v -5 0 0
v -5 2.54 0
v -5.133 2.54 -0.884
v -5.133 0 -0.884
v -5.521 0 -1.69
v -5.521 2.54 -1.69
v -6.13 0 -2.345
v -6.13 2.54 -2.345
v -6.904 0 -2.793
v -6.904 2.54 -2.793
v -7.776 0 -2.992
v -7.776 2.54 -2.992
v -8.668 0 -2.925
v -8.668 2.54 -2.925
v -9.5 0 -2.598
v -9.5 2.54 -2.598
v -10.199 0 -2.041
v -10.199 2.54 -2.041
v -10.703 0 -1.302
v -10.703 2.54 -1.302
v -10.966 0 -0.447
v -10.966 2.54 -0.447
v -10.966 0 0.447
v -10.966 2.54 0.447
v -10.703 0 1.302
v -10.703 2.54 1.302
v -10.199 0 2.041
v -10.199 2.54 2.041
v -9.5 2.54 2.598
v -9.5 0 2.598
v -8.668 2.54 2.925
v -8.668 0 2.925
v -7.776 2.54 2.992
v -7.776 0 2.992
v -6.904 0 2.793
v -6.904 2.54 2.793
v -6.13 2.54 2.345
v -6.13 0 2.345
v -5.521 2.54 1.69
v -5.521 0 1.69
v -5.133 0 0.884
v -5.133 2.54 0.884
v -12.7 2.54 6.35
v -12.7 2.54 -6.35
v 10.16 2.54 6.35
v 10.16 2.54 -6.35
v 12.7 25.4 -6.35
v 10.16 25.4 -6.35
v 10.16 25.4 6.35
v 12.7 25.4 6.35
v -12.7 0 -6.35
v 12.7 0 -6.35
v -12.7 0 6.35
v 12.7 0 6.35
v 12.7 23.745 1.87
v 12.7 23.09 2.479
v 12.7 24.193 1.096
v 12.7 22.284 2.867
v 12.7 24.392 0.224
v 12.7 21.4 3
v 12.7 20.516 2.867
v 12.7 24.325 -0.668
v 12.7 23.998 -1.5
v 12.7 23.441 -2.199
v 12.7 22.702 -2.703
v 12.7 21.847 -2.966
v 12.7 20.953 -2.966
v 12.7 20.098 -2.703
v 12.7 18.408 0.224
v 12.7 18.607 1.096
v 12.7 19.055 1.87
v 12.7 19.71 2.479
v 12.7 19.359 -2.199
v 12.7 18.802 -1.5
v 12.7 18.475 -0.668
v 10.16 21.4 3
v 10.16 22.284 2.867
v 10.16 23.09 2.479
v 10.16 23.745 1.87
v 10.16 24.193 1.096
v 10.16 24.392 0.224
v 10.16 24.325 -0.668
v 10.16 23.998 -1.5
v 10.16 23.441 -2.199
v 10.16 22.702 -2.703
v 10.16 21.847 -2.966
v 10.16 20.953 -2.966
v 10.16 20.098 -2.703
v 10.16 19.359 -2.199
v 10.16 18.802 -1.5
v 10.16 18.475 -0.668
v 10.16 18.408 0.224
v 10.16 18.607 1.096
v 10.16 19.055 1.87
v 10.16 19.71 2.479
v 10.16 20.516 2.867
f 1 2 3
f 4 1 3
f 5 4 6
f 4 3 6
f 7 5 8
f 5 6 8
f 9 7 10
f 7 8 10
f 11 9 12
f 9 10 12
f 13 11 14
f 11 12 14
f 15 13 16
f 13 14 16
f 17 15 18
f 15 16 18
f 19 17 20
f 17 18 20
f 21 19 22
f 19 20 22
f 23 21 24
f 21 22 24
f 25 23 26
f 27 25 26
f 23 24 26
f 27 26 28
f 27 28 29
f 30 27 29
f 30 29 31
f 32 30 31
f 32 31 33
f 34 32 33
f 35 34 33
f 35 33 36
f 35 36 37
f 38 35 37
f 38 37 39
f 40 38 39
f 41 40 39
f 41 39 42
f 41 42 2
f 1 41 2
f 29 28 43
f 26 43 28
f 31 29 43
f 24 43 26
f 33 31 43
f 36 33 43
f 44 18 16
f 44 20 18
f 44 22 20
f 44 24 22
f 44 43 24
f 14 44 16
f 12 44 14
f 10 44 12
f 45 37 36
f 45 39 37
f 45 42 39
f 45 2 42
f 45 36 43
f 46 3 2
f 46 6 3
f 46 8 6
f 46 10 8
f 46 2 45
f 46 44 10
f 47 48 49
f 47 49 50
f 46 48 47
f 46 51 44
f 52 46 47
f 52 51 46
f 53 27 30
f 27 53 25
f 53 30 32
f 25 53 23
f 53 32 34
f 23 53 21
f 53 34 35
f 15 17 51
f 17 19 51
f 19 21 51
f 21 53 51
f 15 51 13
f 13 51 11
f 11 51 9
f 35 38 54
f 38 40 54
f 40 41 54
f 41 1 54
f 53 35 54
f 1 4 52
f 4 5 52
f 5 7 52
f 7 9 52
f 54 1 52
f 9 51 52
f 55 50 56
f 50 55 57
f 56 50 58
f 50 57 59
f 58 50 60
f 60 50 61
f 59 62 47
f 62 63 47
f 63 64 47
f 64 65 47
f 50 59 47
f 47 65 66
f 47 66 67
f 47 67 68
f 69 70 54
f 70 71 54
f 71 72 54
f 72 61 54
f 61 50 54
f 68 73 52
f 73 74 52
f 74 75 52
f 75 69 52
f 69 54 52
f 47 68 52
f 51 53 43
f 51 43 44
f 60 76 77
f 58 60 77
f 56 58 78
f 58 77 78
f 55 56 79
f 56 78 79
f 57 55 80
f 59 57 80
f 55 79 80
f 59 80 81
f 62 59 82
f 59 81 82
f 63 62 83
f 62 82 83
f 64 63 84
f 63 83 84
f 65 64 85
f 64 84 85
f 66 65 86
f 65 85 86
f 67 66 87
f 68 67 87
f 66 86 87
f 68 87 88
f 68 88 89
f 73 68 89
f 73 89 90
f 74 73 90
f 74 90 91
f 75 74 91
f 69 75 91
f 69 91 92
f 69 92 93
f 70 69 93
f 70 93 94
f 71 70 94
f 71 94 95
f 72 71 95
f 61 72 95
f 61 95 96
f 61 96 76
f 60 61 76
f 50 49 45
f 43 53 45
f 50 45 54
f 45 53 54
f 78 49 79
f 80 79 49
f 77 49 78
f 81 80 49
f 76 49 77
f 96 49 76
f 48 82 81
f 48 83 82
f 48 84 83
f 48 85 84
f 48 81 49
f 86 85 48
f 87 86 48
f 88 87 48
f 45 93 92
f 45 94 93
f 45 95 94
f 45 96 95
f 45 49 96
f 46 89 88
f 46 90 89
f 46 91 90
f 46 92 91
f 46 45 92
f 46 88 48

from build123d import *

# Parameters (mm, degrees)
SKETCH1_W           = 25.4
SKETCH1_H           = 12.7
BOSS_EXTRUDE1_DEPTH = 2.54
SKETCH2_W           = 2.54
SKETCH2_H           = 12.7
BOSS_EXTRUDE2_DEPTH = 22.86
SKETCH3_R           = 3
CUT_EXTRUDE1_DEPTH  = 22.86
SKETCH4_R           = 3
CUT_EXTRUDE2_DEPTH  = 22.86


with BuildPart() as part:
    # Sketch1 → Boss-Extrude1 (new body)
    with BuildSketch(Plane(origin=(0, 0, 0), x_dir=(1, 0, 0), z_dir=(0, 1, 0))):
        Rectangle(SKETCH1_W, SKETCH1_H)
    extrude(amount=BOSS_EXTRUDE1_DEPTH)

    # Sketch2 → Boss-Extrude2 (add)
    with BuildSketch(Plane(origin=(0, 2.54, 0), x_dir=(1, 0, 0), z_dir=(0, 1, 0))):
        with Locations((11.43, 0)):
            Rectangle(SKETCH2_W, SKETCH2_H)
    extrude(amount=BOSS_EXTRUDE2_DEPTH)

    # Sketch3 → Cut-Extrude1 (cut)
    with BuildSketch(Plane(origin=(0, 2.54, 0), x_dir=(1, 0, 0), z_dir=(0, 1, 0))):
        with Locations((-8, 0)):
            Circle(SKETCH3_R)
    extrude(amount=-CUT_EXTRUDE1_DEPTH, mode=Mode.SUBTRACT)

    # Sketch4 → Cut-Extrude2 (cut)
    with BuildSketch(Plane.ZY.offset(-10.16)):
        with Locations((0, 21.4)):
            Circle(SKETCH4_R)
    extrude(amount=-CUT_EXTRUDE2_DEPTH, mode=Mode.SUBTRACT)


solid = part.part
